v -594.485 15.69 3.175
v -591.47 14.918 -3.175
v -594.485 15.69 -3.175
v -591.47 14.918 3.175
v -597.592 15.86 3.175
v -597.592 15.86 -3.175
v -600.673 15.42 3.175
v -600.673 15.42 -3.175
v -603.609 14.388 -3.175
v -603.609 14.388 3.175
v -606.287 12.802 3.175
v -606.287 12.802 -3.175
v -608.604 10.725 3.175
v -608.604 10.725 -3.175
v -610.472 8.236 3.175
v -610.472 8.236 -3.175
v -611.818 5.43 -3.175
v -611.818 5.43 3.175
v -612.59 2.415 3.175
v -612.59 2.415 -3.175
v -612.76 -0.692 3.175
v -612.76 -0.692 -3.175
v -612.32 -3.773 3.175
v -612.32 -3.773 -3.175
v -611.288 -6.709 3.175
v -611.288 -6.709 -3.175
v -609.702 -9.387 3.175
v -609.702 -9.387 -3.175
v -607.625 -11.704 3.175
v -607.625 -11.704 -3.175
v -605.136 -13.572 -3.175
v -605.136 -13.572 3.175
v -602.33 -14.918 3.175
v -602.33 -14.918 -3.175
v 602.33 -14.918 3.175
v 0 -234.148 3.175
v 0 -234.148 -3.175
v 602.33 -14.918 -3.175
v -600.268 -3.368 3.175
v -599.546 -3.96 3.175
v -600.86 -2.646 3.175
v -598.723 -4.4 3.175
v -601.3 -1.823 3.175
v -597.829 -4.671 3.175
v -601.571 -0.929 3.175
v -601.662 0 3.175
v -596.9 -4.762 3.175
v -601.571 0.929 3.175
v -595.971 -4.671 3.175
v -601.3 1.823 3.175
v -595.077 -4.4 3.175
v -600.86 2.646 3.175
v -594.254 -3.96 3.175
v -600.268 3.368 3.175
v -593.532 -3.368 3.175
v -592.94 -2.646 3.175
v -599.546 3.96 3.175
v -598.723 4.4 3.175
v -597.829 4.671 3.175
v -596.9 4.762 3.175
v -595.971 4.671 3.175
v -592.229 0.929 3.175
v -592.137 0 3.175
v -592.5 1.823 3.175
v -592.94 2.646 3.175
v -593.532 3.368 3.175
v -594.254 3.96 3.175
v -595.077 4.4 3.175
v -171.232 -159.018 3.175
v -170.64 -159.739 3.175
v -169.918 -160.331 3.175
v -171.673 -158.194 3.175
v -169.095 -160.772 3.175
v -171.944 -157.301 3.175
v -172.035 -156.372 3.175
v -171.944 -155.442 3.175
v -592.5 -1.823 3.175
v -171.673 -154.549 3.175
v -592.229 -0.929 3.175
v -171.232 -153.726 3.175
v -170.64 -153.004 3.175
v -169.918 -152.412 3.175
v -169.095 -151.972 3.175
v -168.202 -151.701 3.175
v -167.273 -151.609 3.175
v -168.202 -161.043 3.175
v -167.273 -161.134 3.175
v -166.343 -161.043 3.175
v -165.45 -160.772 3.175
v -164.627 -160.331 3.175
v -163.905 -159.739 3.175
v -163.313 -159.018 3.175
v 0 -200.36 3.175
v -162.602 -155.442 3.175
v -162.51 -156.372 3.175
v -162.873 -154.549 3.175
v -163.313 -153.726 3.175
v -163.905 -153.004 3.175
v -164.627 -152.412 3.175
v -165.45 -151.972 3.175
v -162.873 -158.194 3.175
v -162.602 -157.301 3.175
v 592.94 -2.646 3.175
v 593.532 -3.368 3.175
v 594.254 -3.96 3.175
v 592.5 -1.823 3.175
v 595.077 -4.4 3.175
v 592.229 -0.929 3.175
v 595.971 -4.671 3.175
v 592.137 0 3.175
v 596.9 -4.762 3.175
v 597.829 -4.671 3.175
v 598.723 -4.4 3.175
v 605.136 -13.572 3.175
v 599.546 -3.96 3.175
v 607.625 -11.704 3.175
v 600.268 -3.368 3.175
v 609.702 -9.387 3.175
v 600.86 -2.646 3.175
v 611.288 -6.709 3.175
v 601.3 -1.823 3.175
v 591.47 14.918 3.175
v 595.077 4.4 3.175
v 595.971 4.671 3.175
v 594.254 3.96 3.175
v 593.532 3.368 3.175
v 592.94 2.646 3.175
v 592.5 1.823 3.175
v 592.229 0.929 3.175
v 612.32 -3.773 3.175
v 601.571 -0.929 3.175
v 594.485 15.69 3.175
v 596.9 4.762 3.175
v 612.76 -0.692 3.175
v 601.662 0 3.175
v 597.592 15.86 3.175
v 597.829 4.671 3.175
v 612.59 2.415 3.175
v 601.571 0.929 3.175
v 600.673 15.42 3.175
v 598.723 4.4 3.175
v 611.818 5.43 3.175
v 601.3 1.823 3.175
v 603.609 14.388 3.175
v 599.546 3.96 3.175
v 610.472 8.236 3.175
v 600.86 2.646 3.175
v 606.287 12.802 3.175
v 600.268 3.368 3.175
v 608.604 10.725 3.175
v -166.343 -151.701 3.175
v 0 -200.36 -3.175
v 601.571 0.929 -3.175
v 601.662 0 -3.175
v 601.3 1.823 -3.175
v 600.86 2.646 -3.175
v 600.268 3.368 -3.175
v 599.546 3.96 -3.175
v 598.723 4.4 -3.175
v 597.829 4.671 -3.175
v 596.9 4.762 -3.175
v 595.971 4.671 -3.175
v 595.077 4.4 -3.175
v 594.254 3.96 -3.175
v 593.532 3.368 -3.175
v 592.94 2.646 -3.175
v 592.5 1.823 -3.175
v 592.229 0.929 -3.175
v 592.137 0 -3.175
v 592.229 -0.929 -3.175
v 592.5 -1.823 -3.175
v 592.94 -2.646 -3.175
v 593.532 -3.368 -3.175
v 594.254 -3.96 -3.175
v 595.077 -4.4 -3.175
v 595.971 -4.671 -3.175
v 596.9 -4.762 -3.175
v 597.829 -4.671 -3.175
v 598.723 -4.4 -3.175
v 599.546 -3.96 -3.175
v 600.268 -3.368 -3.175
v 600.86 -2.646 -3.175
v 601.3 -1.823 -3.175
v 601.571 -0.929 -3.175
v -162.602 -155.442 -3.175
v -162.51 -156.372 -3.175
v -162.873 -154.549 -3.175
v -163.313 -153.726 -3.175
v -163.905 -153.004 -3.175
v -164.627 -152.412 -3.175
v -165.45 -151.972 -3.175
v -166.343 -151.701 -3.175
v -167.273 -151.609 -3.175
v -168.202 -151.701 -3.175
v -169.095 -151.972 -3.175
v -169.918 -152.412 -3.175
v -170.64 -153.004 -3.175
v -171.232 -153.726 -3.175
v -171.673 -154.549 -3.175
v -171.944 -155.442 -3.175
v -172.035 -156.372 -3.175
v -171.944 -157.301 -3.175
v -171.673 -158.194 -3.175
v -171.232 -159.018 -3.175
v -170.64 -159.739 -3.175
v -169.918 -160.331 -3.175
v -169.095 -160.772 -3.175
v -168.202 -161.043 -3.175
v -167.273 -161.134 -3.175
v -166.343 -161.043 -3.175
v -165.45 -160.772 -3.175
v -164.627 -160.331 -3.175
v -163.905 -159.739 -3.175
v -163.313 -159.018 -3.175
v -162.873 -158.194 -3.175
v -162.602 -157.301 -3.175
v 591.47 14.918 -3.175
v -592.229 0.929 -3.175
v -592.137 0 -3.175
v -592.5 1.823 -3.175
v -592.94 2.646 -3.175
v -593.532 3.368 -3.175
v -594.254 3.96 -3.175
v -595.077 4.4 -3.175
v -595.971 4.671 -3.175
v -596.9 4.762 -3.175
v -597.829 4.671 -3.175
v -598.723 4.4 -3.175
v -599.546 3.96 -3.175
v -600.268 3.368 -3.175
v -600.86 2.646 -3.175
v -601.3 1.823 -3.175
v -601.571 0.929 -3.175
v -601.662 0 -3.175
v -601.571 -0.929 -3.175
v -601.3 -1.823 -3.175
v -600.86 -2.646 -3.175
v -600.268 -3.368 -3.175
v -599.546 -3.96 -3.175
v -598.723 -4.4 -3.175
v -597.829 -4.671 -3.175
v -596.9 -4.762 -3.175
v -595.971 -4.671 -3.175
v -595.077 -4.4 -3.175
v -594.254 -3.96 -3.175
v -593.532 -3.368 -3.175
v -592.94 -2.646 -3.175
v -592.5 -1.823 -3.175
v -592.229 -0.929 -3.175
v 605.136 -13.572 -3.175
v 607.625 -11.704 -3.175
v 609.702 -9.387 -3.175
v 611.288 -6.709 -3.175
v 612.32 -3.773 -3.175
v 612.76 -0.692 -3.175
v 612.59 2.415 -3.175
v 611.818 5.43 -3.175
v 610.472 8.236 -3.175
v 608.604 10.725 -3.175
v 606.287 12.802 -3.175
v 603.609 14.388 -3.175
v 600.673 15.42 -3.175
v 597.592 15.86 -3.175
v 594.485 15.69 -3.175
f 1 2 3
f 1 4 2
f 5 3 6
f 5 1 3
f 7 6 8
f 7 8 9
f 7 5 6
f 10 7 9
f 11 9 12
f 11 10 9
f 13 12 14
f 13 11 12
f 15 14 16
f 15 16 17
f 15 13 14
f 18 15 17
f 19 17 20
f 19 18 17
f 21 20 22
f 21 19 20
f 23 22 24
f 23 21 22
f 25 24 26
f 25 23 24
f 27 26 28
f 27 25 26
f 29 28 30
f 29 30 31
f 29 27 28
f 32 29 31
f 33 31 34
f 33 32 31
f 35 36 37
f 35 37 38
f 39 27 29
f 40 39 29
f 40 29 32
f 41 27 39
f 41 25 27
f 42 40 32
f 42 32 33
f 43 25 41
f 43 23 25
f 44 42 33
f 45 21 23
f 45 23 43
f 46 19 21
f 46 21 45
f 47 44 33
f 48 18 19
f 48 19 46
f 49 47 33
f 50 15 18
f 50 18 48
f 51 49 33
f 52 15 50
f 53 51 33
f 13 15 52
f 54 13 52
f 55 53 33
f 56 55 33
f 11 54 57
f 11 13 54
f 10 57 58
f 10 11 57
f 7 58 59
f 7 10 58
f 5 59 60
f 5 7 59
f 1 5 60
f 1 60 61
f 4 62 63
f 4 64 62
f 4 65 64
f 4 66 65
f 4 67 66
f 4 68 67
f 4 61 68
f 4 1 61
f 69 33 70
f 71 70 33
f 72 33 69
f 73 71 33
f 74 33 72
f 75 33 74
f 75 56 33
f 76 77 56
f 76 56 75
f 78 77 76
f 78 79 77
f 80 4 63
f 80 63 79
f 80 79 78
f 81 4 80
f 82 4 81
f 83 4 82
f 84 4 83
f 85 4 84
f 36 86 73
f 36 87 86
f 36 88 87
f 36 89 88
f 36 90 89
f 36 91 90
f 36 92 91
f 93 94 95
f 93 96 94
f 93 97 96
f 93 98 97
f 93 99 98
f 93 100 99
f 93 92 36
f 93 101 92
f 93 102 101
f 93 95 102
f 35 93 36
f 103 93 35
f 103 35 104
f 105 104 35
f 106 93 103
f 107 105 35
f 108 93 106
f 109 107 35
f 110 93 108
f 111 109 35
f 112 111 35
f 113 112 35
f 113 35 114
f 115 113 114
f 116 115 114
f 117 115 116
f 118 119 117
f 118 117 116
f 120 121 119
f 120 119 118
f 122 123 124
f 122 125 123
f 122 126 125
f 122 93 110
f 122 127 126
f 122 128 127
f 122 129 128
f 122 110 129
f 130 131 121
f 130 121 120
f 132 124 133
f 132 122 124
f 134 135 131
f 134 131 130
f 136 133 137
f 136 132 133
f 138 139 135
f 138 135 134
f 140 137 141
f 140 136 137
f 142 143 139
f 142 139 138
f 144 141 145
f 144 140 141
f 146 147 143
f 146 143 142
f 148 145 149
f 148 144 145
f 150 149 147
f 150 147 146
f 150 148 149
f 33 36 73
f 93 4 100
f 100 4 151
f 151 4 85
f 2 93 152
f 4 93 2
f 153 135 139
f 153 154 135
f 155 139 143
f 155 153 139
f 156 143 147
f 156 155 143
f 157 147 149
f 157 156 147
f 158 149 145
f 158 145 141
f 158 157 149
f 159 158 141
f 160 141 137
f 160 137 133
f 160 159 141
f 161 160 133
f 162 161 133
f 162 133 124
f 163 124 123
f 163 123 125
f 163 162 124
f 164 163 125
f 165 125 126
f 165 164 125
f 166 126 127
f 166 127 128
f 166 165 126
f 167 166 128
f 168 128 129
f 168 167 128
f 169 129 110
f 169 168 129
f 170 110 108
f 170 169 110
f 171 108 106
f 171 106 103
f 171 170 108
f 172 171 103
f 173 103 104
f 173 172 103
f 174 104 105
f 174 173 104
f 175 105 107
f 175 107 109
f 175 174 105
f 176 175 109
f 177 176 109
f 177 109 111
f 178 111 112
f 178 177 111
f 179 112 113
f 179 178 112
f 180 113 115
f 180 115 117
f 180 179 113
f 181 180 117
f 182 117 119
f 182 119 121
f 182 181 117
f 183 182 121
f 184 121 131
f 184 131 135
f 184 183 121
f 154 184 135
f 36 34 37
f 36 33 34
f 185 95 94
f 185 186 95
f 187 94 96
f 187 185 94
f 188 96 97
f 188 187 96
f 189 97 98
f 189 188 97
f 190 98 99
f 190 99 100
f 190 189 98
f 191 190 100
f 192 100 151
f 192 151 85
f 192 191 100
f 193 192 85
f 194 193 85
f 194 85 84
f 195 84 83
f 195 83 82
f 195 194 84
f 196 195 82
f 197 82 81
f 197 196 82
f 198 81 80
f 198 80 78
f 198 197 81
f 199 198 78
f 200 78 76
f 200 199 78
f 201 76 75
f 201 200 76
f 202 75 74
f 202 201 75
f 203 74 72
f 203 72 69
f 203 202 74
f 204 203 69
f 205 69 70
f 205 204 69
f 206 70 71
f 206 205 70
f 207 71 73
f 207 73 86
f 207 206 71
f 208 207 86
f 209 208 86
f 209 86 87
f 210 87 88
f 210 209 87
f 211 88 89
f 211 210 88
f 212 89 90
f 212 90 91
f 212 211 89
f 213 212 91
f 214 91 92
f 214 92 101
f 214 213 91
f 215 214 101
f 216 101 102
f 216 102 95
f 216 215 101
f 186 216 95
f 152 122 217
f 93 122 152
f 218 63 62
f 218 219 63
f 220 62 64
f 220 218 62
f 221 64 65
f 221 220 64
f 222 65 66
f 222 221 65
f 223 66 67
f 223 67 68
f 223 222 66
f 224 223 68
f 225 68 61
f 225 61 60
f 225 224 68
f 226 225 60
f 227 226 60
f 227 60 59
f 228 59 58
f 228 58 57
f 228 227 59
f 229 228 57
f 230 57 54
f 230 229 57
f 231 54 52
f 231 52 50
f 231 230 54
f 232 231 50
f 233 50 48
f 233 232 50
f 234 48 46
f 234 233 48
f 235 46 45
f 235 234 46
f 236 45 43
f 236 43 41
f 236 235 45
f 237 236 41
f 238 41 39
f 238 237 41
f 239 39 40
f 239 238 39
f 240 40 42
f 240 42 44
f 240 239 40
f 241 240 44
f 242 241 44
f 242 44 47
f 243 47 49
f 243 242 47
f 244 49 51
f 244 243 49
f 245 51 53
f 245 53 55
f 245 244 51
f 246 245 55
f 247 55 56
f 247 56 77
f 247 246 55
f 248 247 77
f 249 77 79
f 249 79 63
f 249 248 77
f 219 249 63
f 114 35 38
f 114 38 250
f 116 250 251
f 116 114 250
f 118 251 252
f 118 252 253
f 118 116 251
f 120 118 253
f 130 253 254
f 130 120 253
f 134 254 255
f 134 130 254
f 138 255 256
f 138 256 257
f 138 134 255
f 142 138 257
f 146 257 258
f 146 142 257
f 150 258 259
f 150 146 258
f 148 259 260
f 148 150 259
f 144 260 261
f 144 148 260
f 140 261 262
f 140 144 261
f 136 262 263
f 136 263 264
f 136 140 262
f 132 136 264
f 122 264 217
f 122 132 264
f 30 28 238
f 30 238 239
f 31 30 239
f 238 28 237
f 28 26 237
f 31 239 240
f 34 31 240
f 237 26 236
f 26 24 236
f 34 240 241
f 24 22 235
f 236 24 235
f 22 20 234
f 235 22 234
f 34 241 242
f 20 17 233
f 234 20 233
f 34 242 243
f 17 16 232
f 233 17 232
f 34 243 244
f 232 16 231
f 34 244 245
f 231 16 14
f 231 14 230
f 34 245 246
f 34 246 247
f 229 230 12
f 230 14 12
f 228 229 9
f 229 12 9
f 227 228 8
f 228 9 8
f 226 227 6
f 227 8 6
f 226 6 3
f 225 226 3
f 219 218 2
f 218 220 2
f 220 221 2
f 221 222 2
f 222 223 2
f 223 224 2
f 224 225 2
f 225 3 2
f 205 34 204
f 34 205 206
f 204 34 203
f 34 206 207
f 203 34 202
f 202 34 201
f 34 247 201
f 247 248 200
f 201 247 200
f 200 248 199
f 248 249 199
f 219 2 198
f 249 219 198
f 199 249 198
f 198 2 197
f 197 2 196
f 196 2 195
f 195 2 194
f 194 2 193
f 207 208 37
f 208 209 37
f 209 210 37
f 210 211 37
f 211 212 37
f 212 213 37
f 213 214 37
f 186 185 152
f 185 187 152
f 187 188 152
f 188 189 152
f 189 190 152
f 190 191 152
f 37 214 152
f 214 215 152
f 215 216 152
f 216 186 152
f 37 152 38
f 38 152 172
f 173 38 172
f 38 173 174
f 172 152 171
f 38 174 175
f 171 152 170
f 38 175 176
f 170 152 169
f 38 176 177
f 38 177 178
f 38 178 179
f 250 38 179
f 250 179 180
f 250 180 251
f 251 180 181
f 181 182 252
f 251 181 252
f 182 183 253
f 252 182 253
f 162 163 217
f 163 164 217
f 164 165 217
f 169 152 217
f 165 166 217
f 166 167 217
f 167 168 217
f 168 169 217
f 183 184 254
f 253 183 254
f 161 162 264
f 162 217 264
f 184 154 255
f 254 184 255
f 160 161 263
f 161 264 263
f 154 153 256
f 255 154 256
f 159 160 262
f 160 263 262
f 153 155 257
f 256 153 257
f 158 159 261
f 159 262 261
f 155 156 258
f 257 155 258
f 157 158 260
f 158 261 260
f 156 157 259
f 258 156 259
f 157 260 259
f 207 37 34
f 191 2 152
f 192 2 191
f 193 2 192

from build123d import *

# Parameters (mm, degrees)
SKETCH1_R           = 4.7625
BOSS_EXTRUDE1_DEPTH = 3.175


with BuildPart() as part:
    # Sketch1 → Boss-Extrude1 (new, symmetric)
    with BuildSketch(Plane.XY):
        with BuildLine():
            Line((-602.329569775, -14.917620355), (0, -234.147654972))
            Line((0, -234.147654972), (602.329569775, -14.917620355))
            ThreePointArc((602.329569775, -14.917620355), (611.817620355, 5.429569775), (591.470430225, 14.917620355))
            Line((591.470430225, 14.917620355), (0, -200.360010695))
            Line((0, -200.360010695), (-591.470430225, 14.917620355))
            ThreePointArc((-591.470430225, 14.917620355), (-611.817620355, 5.429569775), (-602.329569775, -14.917620355))
        make_face()
        with Locations((-596.9, 0)):
            Circle(SKETCH1_R, mode=Mode.SUBTRACT)
        with Locations((596.9, 0)):
            Circle(SKETCH1_R, mode=Mode.SUBTRACT)
        with Locations((-167.272533777, -156.371609528)):
            Circle(SKETCH1_R, mode=Mode.SUBTRACT)
    extrude(amount=BOSS_EXTRUDE1_DEPTH, both=True)


solid = part.part
